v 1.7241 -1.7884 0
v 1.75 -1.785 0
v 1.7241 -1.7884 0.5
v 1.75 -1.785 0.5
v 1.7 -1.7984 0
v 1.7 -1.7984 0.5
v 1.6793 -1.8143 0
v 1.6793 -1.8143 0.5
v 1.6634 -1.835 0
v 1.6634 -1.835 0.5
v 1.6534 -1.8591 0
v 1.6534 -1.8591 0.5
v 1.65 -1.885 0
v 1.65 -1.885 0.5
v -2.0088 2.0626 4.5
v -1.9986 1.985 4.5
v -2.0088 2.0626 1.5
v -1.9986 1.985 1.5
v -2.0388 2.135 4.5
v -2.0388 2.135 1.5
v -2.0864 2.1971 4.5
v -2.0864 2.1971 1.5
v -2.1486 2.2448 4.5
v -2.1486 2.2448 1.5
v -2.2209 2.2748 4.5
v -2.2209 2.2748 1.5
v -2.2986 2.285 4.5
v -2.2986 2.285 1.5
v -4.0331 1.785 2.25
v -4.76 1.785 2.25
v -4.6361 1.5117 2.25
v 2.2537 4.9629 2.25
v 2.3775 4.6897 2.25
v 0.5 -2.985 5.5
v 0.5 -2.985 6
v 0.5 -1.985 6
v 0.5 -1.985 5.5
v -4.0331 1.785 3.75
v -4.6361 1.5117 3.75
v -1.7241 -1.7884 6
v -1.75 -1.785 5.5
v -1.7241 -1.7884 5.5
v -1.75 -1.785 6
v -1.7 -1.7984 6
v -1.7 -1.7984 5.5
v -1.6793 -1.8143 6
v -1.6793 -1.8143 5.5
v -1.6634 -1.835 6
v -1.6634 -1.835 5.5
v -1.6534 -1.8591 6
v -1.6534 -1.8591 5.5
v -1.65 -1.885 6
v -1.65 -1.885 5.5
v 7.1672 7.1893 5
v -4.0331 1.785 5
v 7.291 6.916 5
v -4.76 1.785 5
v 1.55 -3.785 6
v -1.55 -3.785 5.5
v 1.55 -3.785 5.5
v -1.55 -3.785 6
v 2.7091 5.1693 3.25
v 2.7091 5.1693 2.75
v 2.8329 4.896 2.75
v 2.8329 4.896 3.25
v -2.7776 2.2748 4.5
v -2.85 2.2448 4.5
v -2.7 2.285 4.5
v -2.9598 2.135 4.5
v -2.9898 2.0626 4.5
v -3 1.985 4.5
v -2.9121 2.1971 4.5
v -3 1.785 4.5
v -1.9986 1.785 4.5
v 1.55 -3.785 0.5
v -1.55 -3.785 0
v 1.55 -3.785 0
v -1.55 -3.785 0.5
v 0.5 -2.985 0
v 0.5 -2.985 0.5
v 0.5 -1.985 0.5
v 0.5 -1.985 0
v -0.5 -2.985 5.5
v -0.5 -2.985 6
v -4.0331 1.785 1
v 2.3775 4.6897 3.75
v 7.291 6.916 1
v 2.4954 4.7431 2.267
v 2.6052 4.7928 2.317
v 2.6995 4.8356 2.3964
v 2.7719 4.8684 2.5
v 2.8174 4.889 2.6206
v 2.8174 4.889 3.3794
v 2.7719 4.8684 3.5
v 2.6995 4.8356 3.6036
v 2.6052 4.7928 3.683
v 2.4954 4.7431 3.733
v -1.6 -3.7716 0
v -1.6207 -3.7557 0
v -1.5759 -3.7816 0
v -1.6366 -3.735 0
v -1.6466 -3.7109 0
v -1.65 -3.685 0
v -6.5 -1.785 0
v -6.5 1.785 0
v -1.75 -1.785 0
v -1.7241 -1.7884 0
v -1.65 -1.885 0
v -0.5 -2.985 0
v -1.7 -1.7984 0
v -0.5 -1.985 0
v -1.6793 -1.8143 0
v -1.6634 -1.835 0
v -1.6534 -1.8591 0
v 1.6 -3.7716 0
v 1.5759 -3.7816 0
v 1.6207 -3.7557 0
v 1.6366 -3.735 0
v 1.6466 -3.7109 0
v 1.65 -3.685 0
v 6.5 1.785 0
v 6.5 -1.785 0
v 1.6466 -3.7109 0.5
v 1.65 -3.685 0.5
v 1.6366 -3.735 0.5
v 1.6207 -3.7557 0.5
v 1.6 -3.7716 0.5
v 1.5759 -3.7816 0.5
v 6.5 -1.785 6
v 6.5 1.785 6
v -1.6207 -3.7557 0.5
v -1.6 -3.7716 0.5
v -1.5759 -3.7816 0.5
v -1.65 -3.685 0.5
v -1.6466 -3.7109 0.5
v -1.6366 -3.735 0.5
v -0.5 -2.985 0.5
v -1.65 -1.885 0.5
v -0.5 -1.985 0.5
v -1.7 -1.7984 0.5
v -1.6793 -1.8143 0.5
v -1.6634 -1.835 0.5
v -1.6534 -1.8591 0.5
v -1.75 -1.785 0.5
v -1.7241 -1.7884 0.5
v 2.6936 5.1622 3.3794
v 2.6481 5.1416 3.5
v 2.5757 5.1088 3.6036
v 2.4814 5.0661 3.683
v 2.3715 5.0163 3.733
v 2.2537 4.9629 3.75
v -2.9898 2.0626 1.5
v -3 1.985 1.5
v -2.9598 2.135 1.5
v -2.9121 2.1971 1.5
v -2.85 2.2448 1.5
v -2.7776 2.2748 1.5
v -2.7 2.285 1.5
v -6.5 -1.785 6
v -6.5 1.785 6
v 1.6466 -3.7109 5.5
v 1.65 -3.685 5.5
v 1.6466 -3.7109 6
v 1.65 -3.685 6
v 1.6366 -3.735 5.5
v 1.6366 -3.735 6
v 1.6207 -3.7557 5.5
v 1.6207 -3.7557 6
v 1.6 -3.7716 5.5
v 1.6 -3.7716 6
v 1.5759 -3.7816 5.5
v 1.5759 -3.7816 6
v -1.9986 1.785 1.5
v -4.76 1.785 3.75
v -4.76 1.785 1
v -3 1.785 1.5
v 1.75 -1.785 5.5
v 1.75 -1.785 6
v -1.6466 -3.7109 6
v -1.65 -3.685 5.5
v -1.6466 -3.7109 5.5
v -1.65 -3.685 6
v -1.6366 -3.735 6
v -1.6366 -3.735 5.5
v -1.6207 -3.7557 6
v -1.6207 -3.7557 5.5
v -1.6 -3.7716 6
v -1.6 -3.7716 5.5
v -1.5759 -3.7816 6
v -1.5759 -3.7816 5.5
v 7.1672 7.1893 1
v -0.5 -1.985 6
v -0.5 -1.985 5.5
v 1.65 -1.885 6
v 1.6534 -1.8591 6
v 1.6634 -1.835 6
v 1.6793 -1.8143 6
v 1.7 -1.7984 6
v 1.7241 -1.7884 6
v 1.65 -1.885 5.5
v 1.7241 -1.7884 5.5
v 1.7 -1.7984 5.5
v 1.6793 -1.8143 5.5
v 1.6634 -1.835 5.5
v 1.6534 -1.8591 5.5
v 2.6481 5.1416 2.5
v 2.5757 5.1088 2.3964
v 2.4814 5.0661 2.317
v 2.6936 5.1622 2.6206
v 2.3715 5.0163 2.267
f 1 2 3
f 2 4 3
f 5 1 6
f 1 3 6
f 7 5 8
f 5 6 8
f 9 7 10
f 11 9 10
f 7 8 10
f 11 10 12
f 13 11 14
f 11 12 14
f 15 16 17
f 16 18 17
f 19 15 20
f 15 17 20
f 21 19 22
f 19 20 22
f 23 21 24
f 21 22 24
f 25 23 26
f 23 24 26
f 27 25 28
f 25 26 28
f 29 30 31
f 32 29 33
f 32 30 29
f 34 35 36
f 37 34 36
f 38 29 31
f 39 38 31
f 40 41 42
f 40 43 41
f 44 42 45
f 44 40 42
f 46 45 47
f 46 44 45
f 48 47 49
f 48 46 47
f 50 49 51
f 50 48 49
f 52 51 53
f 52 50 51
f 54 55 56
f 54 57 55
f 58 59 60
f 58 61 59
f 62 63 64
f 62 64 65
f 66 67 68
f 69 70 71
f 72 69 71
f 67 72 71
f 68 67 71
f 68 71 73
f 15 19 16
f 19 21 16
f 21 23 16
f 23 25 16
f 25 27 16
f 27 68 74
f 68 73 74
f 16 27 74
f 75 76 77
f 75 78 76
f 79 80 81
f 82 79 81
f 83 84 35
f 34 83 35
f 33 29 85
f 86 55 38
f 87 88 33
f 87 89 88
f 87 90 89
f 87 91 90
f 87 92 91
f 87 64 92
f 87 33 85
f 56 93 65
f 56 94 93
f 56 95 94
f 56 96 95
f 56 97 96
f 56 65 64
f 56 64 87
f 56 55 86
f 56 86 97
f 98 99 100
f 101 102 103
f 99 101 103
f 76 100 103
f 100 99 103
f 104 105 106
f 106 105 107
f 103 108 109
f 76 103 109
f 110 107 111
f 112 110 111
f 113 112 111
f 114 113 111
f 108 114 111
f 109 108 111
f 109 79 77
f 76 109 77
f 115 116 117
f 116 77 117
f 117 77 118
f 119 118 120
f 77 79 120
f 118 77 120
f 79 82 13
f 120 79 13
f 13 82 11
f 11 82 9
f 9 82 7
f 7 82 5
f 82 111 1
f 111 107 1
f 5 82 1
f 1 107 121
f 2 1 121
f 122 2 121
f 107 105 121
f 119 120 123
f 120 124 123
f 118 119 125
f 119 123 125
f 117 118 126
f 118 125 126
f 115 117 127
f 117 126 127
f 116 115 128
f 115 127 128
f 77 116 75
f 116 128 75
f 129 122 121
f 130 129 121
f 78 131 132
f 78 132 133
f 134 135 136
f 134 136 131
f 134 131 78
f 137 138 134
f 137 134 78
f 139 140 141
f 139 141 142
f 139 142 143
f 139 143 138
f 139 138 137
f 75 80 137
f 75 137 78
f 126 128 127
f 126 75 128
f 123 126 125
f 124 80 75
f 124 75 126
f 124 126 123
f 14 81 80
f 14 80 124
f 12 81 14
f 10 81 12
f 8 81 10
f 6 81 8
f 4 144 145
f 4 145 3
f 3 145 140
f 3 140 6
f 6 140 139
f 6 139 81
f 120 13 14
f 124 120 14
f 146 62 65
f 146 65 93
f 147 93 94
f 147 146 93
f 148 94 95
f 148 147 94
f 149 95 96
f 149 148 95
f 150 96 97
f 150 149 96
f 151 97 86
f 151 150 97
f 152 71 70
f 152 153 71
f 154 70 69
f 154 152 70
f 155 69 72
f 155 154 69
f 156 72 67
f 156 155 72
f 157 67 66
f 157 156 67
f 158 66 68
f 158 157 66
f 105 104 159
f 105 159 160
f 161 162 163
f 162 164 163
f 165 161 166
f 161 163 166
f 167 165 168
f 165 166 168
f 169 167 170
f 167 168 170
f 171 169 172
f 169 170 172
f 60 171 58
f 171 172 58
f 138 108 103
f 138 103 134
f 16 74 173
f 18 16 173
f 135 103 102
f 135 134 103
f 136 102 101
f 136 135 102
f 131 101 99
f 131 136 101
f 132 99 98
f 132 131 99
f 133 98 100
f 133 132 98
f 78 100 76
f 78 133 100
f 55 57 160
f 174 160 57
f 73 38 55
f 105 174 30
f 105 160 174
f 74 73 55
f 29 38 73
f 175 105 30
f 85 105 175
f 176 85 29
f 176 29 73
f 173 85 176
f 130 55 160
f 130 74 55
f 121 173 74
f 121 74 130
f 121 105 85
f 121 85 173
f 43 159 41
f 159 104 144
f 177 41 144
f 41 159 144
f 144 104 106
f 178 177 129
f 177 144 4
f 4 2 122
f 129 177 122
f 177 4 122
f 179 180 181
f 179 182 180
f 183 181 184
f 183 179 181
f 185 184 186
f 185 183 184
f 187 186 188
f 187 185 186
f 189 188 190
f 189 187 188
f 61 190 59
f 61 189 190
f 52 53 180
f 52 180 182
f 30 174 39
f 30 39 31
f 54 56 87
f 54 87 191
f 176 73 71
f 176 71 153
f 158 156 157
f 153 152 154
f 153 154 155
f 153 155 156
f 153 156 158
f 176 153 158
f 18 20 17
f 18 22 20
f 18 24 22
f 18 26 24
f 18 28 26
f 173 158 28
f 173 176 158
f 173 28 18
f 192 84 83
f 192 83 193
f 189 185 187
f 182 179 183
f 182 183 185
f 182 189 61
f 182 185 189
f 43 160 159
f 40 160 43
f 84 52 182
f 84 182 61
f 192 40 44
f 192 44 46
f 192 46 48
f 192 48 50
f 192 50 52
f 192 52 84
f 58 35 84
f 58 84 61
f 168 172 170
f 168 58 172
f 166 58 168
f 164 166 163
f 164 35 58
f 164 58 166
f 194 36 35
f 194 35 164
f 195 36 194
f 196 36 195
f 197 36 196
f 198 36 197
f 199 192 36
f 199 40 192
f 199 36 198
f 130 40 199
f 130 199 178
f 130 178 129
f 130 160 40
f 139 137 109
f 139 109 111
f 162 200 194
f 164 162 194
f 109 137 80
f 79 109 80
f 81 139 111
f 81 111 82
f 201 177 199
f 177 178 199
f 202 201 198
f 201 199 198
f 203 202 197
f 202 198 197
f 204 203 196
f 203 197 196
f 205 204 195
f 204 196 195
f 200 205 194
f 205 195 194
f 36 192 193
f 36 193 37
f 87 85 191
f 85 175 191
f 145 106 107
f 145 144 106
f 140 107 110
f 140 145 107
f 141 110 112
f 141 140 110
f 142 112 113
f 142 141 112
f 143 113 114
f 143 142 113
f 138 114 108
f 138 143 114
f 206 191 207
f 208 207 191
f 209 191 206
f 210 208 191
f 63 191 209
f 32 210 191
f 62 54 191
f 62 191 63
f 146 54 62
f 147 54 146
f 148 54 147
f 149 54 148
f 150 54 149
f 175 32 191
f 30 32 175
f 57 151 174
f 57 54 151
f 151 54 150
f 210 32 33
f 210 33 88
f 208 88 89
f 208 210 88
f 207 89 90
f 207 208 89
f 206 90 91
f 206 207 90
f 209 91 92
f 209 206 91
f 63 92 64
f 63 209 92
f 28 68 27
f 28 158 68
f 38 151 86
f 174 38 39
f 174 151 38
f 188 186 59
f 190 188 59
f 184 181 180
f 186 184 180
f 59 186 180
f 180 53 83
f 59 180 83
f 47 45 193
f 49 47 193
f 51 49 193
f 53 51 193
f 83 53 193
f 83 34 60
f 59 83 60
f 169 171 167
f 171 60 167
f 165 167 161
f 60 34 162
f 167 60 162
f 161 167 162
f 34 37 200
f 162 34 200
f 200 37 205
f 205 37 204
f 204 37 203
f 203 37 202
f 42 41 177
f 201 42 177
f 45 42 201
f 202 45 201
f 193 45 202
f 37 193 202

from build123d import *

# Parameters (mm, degrees)
SCHIZZO1_W                   = 13
SCHIZZO1_H                   = 3.57
ESTRUSIONE_ESTRUSIONE1_DEPTH = 6
SCHIZZO3_W                   = 3.3
SCHIZZO3_H                   = 0.5
ESTRUSIONE_ESTRUSIONE2_DEPTH = 2
RACCORDO1_R                  = 0.1
SCHIZZO4_W                   = 1
SCHIZZO4_H                   = 1
TAGLIO_ESTRUSIONE1_DEPTH     = 7
SCHIZZO5_W                   = 1.001424396
SCHIZZO5_H                   = 3
ESTRUSIONE_ESTRUSIONE3_DEPTH = 0.5
RACCORDO2_R                  = 0.3
ESTRUSIONE_ESTRUSIONE4_DEPTH = 4
TAGLIO_ESTRUSIONE2_DEPTH     = 0.3


with BuildPart() as part:
    # Schizzo1 → Estrusione-Estrusione1 (new body)
    with BuildSketch(Plane.XY):
        Rectangle(SCHIZZO1_W, SCHIZZO1_H)
    extrude(amount=ESTRUSIONE_ESTRUSIONE1_DEPTH)

    # Schizzo3 → Estrusione-Estrusione2 (add)
    with BuildSketch(Plane.XZ.offset(1.785)):
        with Locations((0, 5.75)):
            Rectangle(SCHIZZO3_W, SCHIZZO3_H)
        with Locations((0, 0.25)):
            Rectangle(SCHIZZO3_W, SCHIZZO3_H)
    extrude(amount=ESTRUSIONE_ESTRUSIONE2_DEPTH)

    # Raccordo1
    raccordo1_edges = [part.edges().sort_by_distance(p)[0] for p in [
        (1.65, -3.785, 0.25),
        (-1.65, -3.785, 0.25),
        (-1.65, -3.785, 5.75),
        (1.65, -3.785, 5.75),
        (-1.65, -1.785, 0.25),
        (1.65, -1.785, 0.25),
        (-1.65, -1.785, 5.75),
        (1.65, -1.785, 5.75),
    ]]
    fillet(raccordo1_edges, radius=RACCORDO1_R)

    # Schizzo4 → Taglio-Estrusione1 (cut, through all)
    with BuildSketch(Plane.XY.offset(6)):
        with Locations((0, -2.485)):
            Rectangle(SCHIZZO4_W, SCHIZZO4_H)
    extrude(amount=-TAGLIO_ESTRUSIONE1_DEPTH, mode=Mode.SUBTRACT)

    # Schizzo5 → Estrusione-Estrusione3 (add)
    with BuildSketch(Plane(origin=(0, 1.785, 0), x_dir=(1, 0, 0), z_dir=(0, 1, 0))):
        with Locations((-2.499287802, -3)):
            Rectangle(SCHIZZO5_W, SCHIZZO5_H)
    extrude(amount=ESTRUSIONE_ESTRUSIONE3_DEPTH)

    # Raccordo2
    raccordo2_edges = [part.edges().sort_by_distance(p)[0] for p in [
        (-3, 2.285, 3),
        (-1.998575604, 2.285, 3),
    ]]
    fillet(raccordo2_edges, radius=RACCORDO2_R)

    # Schizzo7 → Estrusione-Estrusione4 (add)
    with BuildSketch(Plane.XY.offset(5)):
        Polygon((-5.428309071, 1.15280402), (7.290989084, 6.916004863), (7.167174091, 7.189262704), (-5.552124064, 1.42606186), align=None)
    extrude(amount=-ESTRUSIONE_ESTRUSIONE4_DEPTH)

    # Schizzo8 → Taglio-Estrusione2 (cut)
    with BuildSketch(Plane(origin=(-1.481816175, 3.270346158, 0), x_dir=(0.910859468, 0.412716645, 0), z_dir=(-0.412716645, 0.910859468, 0))):
        with BuildLine():
            Line((-3.598949006, -2.25), (4.101050994, -2.25))
            ThreePointArc((4.101050994, -2.25), (4.454604385, -2.396446609), (4.601050994, -2.75))
            Line((4.601050994, -2.75), (4.601050994, -3.25))
            ThreePointArc((4.601050994, -3.25), (4.454604385, -3.603553391), (4.101050994, -3.75))
            Line((4.101050994, -3.75), (-3.598949006, -3.75))
            Line((-3.598949006, -3.75), (-3.598949006, -2.25))
        make_face()
    extrude(amount=-TAGLIO_ESTRUSIONE2_DEPTH, mode=Mode.SUBTRACT)


solid = part.part
